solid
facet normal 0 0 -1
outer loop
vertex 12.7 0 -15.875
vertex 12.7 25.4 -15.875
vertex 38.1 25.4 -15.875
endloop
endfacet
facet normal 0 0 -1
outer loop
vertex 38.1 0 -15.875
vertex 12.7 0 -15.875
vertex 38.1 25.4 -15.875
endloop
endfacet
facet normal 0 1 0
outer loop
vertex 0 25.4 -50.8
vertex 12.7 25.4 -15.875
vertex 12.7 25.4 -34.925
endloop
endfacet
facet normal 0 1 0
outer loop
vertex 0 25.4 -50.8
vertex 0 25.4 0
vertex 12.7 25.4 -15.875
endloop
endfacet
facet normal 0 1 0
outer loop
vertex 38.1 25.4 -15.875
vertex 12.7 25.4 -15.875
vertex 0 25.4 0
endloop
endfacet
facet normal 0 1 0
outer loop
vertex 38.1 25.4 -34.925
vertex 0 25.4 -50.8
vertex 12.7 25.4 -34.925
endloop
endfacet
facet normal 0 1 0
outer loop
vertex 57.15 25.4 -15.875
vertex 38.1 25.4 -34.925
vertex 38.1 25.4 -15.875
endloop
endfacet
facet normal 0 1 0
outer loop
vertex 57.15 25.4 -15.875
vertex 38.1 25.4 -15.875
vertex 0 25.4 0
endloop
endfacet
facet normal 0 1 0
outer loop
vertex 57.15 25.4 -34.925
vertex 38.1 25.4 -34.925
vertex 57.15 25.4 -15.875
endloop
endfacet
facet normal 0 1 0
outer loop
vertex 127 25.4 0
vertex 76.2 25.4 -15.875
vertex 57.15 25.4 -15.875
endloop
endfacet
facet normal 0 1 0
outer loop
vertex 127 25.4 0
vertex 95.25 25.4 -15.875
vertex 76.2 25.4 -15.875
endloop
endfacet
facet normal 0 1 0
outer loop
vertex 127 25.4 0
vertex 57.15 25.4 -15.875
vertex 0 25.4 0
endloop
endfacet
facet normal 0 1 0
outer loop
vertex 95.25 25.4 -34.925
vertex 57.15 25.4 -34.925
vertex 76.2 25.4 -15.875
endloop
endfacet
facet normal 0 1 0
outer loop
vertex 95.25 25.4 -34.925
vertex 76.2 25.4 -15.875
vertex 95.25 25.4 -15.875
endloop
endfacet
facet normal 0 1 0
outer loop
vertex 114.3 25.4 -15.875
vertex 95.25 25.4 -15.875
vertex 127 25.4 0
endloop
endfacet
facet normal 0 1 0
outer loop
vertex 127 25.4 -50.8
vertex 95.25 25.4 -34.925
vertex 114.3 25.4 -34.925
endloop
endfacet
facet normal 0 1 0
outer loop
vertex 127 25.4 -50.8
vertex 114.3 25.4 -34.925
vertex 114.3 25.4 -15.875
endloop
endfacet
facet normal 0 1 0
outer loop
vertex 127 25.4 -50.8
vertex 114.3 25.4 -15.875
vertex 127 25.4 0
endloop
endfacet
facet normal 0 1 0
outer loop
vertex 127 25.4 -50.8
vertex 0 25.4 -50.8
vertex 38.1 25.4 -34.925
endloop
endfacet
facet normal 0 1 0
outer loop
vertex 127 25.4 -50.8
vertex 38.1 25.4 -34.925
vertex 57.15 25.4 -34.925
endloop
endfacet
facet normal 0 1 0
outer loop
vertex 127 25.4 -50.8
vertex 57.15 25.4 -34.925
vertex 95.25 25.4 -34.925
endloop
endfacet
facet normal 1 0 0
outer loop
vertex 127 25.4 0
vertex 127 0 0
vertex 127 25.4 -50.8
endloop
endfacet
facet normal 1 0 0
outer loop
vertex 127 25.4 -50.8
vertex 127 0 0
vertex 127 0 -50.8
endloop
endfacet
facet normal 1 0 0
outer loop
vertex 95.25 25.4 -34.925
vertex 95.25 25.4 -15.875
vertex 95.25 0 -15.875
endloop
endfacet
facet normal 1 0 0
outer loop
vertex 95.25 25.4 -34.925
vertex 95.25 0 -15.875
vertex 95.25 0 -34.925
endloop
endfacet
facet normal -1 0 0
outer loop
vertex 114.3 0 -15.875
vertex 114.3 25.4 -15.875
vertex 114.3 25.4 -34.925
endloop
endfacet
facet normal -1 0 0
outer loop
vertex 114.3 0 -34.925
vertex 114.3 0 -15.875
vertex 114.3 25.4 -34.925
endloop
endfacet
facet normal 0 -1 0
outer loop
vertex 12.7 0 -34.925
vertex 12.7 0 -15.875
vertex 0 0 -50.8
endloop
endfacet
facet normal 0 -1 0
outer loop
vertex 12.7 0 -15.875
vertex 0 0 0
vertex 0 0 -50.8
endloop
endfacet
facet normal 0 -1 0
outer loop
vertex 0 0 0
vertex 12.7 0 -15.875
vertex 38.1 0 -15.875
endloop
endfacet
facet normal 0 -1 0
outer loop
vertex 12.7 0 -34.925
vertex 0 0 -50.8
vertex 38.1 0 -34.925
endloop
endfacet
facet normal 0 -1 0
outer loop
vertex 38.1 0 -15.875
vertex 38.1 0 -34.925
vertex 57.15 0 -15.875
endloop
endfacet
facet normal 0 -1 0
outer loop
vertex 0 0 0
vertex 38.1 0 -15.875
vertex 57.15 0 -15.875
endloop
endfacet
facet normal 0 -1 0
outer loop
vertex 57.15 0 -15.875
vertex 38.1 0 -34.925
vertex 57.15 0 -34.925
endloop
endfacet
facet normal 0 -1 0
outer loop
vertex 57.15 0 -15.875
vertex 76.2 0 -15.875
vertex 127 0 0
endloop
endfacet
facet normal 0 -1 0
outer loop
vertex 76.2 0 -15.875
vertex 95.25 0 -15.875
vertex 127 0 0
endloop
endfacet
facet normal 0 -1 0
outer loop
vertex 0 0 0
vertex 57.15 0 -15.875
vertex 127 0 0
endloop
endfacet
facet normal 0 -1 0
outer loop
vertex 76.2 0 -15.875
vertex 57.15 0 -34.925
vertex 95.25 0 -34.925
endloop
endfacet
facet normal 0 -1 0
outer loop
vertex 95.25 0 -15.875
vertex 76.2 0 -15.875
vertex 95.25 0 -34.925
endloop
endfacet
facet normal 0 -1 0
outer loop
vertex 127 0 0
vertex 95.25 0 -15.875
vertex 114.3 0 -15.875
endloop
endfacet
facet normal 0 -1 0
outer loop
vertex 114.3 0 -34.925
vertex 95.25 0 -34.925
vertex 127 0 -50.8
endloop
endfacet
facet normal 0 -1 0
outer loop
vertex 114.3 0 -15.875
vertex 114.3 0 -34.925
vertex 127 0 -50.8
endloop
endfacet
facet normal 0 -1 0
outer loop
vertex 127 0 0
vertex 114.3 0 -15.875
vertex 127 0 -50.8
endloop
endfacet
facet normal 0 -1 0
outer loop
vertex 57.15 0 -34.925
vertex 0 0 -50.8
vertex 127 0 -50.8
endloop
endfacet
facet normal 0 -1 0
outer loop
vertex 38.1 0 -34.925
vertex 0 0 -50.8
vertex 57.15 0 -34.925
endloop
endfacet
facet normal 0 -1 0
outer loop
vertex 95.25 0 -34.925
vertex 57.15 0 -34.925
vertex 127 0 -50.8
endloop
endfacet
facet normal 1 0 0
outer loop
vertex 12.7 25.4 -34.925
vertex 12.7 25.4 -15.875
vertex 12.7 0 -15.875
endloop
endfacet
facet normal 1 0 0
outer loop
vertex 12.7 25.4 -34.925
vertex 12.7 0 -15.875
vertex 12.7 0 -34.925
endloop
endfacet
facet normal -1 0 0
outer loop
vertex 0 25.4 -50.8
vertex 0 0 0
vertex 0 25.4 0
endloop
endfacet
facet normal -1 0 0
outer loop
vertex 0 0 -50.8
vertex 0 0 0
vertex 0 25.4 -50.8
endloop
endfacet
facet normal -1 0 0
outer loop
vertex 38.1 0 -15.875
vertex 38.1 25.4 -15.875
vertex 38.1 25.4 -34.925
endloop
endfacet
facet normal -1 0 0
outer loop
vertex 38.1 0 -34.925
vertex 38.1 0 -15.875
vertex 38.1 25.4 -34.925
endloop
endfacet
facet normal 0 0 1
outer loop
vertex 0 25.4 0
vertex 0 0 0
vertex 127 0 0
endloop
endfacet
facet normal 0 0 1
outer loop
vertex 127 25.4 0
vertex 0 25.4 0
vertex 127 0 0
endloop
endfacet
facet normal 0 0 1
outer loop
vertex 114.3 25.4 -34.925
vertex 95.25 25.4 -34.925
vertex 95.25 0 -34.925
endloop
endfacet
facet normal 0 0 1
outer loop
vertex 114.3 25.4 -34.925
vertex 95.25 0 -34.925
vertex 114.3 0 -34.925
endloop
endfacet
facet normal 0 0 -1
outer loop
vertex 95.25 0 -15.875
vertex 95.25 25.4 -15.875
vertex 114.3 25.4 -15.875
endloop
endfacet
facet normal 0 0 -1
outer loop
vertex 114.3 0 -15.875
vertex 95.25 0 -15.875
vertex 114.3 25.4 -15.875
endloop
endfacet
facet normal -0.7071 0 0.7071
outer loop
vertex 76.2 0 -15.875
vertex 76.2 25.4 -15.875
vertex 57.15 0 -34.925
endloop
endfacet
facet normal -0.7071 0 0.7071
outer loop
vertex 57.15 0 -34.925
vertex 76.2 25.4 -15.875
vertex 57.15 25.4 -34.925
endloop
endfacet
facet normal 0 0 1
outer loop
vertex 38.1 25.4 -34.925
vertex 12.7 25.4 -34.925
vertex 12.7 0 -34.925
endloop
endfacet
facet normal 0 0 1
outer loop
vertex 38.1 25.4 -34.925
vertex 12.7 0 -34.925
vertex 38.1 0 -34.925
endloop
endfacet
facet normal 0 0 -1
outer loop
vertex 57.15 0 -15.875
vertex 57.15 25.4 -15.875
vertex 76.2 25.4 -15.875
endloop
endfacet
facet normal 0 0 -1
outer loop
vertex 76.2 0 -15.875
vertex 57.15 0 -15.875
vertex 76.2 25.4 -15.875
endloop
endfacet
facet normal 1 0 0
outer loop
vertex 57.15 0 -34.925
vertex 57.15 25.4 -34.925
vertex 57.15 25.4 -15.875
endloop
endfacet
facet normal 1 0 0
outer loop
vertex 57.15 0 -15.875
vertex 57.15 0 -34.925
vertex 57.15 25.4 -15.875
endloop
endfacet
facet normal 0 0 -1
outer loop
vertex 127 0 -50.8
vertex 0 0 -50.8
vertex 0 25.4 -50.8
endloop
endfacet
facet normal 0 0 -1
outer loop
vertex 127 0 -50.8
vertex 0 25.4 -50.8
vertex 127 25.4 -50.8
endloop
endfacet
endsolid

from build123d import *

# Parameters (mm, degrees)
SKETCH1_W           = 127
SKETCH1_H           = 50.8
BOSS_EXTRUDE1_DEPTH = 25.4
SKETCH2_W           = 25.4
SKETCH2_H           = 19.05
SKETCH2_W_2         = 19.05
CUT_EXTRUDE1_DEPTH  = 26.4


with BuildPart() as part:
    # Sketch1 → Boss-Extrude1 (new body)
    with BuildSketch(Plane(origin=(0, 0, 0), x_dir=(1, 0, 0), z_dir=(0, 1, 0))):
        with Locations((63.5, 25.4)):
            Rectangle(SKETCH1_W, SKETCH1_H)
    extrude(amount=BOSS_EXTRUDE1_DEPTH)

    # Sketch2 → Cut-Extrude1 (cut, through all)
    with BuildSketch(Plane(origin=(0, 25.4, 0), x_dir=(1, 0, 0), z_dir=(0, 1, 0))):
        Polygon((57.15, 34.925), (57.15, 15.875), (76.2, 15.875), align=None)
        with Locations((25.4, 25.4)):
            Rectangle(SKETCH2_W, SKETCH2_H)
        with Locations((104.775, 25.4)):
            Rectangle(SKETCH2_W_2, SKETCH2_H)
    extrude(amount=-CUT_EXTRUDE1_DEPTH, mode=Mode.SUBTRACT)


solid = part.part
